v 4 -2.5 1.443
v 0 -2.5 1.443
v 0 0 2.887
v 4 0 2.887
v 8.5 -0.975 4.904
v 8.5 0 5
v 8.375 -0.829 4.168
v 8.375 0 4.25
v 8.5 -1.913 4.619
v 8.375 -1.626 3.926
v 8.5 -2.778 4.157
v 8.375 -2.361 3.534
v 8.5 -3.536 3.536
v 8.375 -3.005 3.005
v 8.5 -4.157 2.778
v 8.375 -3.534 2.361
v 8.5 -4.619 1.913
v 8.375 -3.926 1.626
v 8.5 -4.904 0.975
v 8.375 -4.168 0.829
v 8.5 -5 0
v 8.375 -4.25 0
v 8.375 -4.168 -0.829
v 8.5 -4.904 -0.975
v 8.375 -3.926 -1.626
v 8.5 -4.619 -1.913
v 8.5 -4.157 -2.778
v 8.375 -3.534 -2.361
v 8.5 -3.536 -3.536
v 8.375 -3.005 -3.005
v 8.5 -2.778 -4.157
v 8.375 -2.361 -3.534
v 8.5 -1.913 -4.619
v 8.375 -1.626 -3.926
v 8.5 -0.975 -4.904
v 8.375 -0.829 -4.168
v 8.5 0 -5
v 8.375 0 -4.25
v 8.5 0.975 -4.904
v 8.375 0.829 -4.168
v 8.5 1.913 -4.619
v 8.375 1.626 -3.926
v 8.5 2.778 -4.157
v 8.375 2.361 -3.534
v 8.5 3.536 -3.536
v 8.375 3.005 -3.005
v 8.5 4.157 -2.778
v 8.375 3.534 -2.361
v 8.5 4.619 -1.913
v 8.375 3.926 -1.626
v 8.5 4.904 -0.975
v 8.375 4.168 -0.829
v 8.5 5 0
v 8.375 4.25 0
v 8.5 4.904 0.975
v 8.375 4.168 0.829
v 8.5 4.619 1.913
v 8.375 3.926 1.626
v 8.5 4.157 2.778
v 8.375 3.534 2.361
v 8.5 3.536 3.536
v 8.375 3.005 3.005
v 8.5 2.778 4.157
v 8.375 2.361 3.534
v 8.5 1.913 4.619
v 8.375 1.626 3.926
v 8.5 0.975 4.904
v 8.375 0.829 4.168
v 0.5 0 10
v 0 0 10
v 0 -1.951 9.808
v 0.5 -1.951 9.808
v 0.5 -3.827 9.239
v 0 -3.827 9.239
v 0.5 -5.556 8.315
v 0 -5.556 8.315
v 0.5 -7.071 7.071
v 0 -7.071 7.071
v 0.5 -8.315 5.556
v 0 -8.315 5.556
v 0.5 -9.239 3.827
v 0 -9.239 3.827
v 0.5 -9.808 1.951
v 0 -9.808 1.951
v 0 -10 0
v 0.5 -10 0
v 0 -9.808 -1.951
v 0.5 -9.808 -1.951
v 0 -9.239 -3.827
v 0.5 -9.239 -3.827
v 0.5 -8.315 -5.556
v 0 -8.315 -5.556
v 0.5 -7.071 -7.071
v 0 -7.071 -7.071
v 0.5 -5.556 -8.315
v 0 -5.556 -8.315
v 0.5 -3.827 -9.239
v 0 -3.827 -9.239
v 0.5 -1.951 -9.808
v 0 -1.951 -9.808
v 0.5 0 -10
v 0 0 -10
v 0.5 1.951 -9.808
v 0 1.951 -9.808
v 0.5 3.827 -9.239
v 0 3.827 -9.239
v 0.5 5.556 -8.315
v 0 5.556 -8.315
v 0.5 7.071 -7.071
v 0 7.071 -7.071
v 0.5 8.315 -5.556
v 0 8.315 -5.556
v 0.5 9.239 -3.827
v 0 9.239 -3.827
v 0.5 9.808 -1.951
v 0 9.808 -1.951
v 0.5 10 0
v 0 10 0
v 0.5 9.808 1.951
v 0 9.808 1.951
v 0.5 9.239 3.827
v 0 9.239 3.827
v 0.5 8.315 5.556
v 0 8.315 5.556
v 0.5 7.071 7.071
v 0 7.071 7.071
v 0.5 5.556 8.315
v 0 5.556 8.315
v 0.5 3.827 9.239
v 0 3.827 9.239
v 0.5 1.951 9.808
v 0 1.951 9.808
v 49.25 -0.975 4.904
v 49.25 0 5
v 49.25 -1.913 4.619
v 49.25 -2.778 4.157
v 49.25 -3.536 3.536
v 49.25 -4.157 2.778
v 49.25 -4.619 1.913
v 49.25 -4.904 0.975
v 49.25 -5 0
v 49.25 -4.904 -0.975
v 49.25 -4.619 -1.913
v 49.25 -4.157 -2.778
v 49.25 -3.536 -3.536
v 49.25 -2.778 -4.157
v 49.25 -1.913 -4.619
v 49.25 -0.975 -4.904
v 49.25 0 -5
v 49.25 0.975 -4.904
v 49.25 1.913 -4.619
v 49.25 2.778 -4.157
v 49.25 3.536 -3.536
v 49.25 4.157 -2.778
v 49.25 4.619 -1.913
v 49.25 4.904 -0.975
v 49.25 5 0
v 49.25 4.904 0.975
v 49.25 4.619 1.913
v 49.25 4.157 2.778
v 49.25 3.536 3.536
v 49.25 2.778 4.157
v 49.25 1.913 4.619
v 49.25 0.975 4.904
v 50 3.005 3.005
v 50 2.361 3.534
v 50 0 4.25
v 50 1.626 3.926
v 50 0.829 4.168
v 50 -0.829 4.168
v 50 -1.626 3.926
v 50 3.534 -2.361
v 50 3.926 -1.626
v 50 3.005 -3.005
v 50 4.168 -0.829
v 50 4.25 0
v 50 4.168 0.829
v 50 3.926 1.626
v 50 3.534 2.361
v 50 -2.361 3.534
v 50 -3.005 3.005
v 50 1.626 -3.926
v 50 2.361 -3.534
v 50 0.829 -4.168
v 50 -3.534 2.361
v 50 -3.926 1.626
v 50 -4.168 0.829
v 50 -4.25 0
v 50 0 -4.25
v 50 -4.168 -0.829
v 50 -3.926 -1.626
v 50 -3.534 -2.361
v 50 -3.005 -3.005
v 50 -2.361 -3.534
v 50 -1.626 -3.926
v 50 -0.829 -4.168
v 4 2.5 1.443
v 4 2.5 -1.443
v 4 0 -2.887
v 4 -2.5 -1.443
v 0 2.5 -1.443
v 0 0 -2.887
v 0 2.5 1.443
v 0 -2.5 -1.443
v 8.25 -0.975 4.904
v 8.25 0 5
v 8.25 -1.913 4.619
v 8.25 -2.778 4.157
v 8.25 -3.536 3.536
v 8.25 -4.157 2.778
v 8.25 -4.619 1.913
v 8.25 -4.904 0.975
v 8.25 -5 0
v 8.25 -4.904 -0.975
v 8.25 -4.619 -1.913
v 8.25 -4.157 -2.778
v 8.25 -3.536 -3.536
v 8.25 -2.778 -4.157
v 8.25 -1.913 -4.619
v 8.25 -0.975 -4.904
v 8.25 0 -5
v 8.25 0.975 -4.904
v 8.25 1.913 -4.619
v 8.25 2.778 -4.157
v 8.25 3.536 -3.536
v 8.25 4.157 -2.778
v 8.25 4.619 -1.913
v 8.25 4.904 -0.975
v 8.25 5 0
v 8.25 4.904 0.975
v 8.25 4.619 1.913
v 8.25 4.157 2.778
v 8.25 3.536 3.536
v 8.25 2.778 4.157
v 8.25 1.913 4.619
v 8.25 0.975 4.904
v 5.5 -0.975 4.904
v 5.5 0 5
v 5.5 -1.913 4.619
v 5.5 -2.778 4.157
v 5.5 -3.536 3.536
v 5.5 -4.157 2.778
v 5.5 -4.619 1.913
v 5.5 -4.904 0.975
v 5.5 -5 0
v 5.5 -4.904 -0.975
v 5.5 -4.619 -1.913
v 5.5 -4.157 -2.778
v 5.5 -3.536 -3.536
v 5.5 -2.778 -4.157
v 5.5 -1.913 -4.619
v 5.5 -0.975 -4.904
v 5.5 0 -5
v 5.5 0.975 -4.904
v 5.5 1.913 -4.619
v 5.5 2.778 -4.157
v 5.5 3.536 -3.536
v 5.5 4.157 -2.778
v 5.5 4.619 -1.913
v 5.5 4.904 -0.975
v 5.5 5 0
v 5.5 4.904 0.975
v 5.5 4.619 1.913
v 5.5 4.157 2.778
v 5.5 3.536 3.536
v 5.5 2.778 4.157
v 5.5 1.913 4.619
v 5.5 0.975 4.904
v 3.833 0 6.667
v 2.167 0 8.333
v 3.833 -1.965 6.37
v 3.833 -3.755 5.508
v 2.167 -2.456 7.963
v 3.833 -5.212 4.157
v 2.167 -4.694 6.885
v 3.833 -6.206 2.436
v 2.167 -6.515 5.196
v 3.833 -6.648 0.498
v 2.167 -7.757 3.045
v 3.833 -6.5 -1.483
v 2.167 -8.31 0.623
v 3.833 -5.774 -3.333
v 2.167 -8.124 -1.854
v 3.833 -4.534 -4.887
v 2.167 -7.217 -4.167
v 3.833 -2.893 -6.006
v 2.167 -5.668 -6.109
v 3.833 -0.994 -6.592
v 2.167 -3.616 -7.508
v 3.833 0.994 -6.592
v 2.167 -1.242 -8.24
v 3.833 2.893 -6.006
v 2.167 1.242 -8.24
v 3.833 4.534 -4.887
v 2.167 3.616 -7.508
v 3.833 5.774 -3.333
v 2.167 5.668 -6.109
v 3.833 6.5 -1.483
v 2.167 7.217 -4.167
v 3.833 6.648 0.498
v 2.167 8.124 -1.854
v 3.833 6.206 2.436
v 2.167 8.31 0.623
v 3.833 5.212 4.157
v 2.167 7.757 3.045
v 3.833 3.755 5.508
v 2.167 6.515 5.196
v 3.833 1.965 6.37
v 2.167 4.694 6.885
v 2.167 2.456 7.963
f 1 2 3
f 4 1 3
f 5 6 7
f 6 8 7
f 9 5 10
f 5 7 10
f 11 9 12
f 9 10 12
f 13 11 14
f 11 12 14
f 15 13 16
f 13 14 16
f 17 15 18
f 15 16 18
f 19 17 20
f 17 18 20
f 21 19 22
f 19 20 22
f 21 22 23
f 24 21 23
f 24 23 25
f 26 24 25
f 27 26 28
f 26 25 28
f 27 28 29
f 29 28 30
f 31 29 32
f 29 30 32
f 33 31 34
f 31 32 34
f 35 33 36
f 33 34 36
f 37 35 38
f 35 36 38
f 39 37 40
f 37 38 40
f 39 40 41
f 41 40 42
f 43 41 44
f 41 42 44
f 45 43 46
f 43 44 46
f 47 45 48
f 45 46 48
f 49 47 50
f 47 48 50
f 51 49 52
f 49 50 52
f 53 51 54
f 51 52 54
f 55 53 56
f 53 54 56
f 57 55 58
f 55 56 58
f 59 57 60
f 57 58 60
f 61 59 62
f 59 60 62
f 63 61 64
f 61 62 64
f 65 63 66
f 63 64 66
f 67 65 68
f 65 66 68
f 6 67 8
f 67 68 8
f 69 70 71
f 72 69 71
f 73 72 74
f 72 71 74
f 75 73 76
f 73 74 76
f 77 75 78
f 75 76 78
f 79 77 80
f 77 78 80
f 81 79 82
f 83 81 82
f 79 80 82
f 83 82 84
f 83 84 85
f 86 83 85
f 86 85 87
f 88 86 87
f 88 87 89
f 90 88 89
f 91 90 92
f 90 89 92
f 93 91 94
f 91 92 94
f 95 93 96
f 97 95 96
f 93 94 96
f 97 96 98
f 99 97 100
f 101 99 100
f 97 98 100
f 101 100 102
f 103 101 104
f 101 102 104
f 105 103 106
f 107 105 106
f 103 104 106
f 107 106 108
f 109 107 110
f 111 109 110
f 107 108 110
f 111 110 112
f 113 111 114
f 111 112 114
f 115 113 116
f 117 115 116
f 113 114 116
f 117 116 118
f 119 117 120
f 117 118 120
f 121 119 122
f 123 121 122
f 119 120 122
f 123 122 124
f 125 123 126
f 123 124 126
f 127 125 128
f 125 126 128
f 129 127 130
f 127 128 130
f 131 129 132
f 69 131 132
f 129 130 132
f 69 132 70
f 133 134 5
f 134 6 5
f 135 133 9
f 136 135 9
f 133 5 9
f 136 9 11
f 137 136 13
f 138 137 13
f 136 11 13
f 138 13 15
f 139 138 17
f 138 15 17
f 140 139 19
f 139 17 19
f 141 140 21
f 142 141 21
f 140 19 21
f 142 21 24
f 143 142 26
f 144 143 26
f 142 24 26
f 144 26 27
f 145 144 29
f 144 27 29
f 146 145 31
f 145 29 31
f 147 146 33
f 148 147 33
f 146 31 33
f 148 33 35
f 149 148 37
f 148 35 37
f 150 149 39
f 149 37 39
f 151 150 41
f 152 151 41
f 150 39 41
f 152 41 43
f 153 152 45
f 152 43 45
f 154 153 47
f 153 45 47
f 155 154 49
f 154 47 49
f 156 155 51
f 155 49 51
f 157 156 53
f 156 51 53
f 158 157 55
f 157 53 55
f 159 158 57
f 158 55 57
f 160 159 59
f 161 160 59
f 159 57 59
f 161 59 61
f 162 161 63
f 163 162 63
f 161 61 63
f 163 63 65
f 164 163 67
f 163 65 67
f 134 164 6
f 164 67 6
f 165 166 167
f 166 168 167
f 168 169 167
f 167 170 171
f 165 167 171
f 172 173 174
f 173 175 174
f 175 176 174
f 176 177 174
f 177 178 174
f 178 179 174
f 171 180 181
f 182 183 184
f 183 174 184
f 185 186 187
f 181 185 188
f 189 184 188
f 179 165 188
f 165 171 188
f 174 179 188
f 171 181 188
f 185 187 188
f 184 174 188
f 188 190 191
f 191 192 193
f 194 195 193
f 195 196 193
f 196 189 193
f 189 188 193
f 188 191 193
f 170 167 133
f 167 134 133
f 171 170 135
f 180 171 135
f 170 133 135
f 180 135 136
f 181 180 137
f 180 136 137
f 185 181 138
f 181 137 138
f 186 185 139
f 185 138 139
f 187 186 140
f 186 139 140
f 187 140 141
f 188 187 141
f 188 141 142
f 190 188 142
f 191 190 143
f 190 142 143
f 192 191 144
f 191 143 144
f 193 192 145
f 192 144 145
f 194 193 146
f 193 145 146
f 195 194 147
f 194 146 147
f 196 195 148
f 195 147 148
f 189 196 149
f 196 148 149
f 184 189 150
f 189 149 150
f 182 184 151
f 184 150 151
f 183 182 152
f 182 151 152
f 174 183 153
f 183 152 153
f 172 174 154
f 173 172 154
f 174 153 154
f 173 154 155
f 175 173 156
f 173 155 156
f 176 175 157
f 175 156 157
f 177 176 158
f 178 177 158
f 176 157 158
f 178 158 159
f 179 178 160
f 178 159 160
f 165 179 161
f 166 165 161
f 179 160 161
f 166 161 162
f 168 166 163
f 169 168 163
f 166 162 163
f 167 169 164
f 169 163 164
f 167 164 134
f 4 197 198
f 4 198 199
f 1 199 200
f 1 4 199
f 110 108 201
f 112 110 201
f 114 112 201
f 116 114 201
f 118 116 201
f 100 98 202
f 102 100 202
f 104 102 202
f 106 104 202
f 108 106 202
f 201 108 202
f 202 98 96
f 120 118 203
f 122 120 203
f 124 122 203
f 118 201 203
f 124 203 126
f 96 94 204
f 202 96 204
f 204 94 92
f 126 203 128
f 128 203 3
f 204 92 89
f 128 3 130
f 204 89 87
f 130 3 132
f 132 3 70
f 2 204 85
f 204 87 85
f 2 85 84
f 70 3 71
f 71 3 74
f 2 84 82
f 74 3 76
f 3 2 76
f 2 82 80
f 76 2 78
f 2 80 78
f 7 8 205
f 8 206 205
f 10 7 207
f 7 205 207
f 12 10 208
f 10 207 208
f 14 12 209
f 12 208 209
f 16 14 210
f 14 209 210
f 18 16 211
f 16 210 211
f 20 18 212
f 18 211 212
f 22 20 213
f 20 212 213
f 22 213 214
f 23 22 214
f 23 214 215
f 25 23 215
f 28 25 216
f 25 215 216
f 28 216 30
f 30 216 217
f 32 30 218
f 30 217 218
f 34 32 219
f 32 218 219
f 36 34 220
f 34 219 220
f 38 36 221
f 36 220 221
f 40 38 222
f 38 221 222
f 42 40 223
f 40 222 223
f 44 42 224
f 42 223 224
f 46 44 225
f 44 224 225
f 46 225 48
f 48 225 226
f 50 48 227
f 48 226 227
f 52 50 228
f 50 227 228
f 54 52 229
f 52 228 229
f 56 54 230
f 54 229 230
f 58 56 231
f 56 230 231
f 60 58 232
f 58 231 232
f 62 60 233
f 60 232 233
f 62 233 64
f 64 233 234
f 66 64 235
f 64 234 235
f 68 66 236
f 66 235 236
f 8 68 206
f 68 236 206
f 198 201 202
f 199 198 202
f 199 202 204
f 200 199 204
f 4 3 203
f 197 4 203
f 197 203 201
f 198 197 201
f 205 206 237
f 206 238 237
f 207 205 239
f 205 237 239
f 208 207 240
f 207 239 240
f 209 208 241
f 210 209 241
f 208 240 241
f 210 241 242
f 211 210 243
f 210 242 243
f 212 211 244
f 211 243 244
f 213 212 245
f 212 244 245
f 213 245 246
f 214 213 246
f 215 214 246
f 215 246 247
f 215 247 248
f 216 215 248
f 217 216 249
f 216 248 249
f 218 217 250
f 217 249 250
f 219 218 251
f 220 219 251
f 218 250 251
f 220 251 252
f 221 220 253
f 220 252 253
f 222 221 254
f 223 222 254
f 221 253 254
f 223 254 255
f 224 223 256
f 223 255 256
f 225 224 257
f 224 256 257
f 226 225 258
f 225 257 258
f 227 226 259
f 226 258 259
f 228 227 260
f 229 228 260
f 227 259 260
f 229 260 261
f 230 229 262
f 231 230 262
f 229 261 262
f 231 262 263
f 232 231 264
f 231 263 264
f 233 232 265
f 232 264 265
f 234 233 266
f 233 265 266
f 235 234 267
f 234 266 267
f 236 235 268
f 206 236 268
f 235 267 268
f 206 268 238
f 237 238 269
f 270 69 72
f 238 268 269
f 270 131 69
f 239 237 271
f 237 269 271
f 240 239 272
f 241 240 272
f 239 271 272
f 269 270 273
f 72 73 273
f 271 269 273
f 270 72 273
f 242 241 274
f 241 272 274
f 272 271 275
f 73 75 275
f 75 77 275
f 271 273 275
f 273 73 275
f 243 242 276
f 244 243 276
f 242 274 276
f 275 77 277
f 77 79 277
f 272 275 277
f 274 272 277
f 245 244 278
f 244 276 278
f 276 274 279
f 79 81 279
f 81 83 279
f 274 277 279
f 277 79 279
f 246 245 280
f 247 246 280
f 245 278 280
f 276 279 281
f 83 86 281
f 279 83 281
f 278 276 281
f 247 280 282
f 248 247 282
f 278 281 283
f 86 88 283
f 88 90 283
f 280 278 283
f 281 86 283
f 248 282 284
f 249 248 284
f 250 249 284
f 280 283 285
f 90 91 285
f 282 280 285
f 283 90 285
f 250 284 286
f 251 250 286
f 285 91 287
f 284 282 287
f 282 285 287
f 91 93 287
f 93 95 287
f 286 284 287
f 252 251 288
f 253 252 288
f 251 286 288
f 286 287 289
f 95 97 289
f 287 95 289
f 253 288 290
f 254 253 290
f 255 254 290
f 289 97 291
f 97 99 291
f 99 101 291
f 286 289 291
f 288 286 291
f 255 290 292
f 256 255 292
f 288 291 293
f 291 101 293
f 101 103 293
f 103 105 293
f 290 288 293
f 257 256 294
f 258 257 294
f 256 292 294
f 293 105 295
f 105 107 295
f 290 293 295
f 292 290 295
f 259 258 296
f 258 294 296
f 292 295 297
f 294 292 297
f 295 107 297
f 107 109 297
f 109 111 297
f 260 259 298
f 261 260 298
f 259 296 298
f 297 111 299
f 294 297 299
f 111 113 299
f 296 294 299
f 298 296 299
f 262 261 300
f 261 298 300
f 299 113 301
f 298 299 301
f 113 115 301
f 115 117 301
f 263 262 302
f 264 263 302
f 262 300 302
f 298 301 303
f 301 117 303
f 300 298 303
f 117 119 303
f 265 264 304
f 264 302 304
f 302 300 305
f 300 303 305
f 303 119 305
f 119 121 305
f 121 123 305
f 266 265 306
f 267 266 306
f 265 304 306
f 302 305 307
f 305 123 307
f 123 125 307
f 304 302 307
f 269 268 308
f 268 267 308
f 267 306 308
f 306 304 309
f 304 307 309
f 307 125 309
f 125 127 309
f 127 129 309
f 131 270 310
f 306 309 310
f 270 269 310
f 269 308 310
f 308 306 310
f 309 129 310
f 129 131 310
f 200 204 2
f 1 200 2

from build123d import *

# Parameters (mm, degrees)
F3_DEPTH = 4
F4_SIZE  = 4.99999


# Not quite as in the source:
# - a fillet or chamfer is up to 0.001 mm smaller than in the source, because OpenCascade refuses the exact size


with BuildPart() as f1:
    # F0 (on Front) → F1 (revolve)
    with BuildSketch(Plane.XZ):
        Polygon((5.5, 5), (5.5, 10), (0, 10), (0, 0), (50, 0), (50, 4.25), (49.25, 5), (8.5, 5), (8.375, 4.25), (8.25, 5), align=None)
    revolve(axis=Axis((25, 0, 0), (1, 0, 0)))

    # F2 (on face) → F3 (cut)
    with BuildSketch(Plane(origin=(0, 0, 0), x_dir=(0, -1, 0), z_dir=(-1, 0, 0))):
        Polygon((0, -2.8867513459), (2.5, -1.443375673), (2.5, 1.443375673), (0, 2.8867513459), (-2.5, 1.443375673), (-2.5, -1.443375673), align=None)
    extrude(amount=-F3_DEPTH, mode=Mode.SUBTRACT)

    # F4 (size 5 in the source; OpenCascade refuses exactly that, so slightly less here)
    f4_edges = [f1.edges().sort_by_distance(p)[0] for p in [
        (5.5, 0, -10),
    ]]
    chamfer(f4_edges, length=F4_SIZE)


solid = f1.part
